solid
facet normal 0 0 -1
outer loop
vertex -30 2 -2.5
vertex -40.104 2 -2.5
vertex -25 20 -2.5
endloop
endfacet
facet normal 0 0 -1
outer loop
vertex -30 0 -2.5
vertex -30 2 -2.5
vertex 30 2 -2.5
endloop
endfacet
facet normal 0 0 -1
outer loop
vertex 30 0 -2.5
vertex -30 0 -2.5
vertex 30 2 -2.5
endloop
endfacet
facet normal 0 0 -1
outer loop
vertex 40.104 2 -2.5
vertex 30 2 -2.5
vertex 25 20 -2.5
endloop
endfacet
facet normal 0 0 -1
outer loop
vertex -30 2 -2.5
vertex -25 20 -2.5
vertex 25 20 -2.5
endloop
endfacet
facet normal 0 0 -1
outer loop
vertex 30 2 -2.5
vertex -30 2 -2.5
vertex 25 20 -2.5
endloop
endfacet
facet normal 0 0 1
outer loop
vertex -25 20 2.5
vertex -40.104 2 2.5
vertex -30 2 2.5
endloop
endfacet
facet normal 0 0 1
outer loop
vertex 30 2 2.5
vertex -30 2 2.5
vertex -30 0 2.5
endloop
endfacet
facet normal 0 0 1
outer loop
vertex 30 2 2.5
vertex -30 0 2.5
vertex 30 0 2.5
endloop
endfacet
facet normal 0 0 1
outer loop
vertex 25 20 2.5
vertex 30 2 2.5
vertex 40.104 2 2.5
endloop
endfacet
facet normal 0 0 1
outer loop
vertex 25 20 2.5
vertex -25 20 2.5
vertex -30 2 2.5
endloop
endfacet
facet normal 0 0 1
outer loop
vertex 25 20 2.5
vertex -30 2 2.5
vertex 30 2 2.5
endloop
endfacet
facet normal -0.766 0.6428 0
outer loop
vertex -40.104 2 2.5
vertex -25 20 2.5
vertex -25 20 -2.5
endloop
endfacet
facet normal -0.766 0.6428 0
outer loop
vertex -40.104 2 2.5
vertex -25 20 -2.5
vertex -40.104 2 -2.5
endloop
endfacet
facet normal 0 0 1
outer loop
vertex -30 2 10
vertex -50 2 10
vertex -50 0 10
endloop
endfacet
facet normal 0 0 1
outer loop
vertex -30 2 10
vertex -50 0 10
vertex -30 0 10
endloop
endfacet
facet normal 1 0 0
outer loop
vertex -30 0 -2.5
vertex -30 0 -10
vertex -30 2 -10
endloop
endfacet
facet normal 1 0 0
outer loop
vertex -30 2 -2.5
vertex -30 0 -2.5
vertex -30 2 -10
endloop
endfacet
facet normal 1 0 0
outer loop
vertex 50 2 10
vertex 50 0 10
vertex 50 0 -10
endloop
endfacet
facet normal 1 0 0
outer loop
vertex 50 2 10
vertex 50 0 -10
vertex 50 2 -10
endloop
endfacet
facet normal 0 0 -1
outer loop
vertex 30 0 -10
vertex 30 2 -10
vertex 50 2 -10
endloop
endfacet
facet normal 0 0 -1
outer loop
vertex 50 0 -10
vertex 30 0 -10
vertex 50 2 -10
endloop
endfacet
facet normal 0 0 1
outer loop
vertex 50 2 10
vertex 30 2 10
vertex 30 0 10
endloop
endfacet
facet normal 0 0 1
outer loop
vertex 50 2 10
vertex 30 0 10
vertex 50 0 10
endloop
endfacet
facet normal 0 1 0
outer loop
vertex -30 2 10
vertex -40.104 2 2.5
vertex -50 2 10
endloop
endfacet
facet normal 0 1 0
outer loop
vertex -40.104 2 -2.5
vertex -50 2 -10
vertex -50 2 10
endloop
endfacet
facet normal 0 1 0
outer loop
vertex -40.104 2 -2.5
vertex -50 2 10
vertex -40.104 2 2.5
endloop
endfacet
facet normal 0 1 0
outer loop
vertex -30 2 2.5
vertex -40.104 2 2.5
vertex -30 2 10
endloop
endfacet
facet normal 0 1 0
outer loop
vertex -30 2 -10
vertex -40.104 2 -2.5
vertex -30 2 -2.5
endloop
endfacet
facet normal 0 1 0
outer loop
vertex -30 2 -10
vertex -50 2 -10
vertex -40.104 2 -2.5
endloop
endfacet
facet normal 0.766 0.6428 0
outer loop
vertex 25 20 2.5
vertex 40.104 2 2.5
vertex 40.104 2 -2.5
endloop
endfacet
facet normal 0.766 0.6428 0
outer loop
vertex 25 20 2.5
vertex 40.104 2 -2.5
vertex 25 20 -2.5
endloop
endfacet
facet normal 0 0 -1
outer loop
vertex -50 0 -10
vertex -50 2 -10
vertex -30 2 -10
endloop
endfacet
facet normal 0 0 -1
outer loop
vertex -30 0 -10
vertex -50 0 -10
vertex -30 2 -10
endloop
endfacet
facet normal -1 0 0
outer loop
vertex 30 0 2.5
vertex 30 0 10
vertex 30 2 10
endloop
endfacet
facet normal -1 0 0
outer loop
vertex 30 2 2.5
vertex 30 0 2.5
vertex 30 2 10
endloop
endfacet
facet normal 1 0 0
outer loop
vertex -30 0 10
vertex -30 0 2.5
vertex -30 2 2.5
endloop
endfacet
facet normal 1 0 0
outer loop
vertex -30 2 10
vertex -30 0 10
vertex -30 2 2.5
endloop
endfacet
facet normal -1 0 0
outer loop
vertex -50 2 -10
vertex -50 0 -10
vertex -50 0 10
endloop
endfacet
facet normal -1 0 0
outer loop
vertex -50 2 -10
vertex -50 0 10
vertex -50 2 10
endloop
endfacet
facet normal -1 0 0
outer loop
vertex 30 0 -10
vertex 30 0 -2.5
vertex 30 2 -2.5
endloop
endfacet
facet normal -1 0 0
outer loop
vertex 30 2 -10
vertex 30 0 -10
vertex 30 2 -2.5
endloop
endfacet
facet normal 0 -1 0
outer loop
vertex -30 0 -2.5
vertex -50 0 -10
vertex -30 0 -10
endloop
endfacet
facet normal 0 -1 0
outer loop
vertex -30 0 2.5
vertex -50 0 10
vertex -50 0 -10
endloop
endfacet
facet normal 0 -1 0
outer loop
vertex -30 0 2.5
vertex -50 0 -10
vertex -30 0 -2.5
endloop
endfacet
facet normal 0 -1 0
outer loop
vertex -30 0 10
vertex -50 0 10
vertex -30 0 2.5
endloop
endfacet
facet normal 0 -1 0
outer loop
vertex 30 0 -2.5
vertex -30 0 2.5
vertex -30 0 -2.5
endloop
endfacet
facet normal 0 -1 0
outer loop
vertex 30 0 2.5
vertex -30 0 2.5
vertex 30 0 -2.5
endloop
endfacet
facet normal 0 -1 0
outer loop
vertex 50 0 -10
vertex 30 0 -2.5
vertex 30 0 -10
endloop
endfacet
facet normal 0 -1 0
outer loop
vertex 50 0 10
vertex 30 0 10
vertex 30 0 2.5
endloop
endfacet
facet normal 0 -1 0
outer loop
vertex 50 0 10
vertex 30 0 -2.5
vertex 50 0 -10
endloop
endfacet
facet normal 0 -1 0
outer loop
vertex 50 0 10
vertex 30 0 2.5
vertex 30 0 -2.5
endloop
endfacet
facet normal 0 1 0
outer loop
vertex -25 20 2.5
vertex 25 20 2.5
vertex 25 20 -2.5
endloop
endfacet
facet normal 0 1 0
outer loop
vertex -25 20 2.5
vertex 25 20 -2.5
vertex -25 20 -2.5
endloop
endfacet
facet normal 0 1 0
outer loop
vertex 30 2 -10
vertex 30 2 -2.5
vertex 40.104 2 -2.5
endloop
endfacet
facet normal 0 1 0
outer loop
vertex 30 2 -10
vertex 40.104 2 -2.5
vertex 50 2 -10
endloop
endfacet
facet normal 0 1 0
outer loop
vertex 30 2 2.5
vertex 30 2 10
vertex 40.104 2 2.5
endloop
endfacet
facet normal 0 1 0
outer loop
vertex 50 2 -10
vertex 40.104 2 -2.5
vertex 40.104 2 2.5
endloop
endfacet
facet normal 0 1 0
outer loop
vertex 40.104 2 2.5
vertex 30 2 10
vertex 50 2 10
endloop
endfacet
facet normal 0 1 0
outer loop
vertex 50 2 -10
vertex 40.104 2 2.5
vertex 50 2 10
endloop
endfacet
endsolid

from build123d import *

# Parameters (mm, degrees)
PAD_DEPTH    = 2.5
SKETCH001_W  = 20
SKETCH001_H  = 2
PAD001_DEPTH = 10


with BuildPart() as part:
    # Sketch → Pad (new body, symmetric)
    with BuildSketch(Plane.XY):
        Polygon((-50, 0), (50, 0), (50, 2), (40.103793, 2), (25, 20), (-25, 20), (-40.103793, 2), (-50, 2), align=None)
    extrude(amount=PAD_DEPTH, both=True)

    # Sketch001 → Pad001 (join, symmetric)
    with BuildSketch(Plane.XY):
        with Locations((-40, 1)):
            Rectangle(SKETCH001_W, SKETCH001_H)
        with Locations((40, 1)):
            Rectangle(SKETCH001_W, SKETCH001_H)
    extrude(amount=PAD001_DEPTH, both=True)


solid = part.part
